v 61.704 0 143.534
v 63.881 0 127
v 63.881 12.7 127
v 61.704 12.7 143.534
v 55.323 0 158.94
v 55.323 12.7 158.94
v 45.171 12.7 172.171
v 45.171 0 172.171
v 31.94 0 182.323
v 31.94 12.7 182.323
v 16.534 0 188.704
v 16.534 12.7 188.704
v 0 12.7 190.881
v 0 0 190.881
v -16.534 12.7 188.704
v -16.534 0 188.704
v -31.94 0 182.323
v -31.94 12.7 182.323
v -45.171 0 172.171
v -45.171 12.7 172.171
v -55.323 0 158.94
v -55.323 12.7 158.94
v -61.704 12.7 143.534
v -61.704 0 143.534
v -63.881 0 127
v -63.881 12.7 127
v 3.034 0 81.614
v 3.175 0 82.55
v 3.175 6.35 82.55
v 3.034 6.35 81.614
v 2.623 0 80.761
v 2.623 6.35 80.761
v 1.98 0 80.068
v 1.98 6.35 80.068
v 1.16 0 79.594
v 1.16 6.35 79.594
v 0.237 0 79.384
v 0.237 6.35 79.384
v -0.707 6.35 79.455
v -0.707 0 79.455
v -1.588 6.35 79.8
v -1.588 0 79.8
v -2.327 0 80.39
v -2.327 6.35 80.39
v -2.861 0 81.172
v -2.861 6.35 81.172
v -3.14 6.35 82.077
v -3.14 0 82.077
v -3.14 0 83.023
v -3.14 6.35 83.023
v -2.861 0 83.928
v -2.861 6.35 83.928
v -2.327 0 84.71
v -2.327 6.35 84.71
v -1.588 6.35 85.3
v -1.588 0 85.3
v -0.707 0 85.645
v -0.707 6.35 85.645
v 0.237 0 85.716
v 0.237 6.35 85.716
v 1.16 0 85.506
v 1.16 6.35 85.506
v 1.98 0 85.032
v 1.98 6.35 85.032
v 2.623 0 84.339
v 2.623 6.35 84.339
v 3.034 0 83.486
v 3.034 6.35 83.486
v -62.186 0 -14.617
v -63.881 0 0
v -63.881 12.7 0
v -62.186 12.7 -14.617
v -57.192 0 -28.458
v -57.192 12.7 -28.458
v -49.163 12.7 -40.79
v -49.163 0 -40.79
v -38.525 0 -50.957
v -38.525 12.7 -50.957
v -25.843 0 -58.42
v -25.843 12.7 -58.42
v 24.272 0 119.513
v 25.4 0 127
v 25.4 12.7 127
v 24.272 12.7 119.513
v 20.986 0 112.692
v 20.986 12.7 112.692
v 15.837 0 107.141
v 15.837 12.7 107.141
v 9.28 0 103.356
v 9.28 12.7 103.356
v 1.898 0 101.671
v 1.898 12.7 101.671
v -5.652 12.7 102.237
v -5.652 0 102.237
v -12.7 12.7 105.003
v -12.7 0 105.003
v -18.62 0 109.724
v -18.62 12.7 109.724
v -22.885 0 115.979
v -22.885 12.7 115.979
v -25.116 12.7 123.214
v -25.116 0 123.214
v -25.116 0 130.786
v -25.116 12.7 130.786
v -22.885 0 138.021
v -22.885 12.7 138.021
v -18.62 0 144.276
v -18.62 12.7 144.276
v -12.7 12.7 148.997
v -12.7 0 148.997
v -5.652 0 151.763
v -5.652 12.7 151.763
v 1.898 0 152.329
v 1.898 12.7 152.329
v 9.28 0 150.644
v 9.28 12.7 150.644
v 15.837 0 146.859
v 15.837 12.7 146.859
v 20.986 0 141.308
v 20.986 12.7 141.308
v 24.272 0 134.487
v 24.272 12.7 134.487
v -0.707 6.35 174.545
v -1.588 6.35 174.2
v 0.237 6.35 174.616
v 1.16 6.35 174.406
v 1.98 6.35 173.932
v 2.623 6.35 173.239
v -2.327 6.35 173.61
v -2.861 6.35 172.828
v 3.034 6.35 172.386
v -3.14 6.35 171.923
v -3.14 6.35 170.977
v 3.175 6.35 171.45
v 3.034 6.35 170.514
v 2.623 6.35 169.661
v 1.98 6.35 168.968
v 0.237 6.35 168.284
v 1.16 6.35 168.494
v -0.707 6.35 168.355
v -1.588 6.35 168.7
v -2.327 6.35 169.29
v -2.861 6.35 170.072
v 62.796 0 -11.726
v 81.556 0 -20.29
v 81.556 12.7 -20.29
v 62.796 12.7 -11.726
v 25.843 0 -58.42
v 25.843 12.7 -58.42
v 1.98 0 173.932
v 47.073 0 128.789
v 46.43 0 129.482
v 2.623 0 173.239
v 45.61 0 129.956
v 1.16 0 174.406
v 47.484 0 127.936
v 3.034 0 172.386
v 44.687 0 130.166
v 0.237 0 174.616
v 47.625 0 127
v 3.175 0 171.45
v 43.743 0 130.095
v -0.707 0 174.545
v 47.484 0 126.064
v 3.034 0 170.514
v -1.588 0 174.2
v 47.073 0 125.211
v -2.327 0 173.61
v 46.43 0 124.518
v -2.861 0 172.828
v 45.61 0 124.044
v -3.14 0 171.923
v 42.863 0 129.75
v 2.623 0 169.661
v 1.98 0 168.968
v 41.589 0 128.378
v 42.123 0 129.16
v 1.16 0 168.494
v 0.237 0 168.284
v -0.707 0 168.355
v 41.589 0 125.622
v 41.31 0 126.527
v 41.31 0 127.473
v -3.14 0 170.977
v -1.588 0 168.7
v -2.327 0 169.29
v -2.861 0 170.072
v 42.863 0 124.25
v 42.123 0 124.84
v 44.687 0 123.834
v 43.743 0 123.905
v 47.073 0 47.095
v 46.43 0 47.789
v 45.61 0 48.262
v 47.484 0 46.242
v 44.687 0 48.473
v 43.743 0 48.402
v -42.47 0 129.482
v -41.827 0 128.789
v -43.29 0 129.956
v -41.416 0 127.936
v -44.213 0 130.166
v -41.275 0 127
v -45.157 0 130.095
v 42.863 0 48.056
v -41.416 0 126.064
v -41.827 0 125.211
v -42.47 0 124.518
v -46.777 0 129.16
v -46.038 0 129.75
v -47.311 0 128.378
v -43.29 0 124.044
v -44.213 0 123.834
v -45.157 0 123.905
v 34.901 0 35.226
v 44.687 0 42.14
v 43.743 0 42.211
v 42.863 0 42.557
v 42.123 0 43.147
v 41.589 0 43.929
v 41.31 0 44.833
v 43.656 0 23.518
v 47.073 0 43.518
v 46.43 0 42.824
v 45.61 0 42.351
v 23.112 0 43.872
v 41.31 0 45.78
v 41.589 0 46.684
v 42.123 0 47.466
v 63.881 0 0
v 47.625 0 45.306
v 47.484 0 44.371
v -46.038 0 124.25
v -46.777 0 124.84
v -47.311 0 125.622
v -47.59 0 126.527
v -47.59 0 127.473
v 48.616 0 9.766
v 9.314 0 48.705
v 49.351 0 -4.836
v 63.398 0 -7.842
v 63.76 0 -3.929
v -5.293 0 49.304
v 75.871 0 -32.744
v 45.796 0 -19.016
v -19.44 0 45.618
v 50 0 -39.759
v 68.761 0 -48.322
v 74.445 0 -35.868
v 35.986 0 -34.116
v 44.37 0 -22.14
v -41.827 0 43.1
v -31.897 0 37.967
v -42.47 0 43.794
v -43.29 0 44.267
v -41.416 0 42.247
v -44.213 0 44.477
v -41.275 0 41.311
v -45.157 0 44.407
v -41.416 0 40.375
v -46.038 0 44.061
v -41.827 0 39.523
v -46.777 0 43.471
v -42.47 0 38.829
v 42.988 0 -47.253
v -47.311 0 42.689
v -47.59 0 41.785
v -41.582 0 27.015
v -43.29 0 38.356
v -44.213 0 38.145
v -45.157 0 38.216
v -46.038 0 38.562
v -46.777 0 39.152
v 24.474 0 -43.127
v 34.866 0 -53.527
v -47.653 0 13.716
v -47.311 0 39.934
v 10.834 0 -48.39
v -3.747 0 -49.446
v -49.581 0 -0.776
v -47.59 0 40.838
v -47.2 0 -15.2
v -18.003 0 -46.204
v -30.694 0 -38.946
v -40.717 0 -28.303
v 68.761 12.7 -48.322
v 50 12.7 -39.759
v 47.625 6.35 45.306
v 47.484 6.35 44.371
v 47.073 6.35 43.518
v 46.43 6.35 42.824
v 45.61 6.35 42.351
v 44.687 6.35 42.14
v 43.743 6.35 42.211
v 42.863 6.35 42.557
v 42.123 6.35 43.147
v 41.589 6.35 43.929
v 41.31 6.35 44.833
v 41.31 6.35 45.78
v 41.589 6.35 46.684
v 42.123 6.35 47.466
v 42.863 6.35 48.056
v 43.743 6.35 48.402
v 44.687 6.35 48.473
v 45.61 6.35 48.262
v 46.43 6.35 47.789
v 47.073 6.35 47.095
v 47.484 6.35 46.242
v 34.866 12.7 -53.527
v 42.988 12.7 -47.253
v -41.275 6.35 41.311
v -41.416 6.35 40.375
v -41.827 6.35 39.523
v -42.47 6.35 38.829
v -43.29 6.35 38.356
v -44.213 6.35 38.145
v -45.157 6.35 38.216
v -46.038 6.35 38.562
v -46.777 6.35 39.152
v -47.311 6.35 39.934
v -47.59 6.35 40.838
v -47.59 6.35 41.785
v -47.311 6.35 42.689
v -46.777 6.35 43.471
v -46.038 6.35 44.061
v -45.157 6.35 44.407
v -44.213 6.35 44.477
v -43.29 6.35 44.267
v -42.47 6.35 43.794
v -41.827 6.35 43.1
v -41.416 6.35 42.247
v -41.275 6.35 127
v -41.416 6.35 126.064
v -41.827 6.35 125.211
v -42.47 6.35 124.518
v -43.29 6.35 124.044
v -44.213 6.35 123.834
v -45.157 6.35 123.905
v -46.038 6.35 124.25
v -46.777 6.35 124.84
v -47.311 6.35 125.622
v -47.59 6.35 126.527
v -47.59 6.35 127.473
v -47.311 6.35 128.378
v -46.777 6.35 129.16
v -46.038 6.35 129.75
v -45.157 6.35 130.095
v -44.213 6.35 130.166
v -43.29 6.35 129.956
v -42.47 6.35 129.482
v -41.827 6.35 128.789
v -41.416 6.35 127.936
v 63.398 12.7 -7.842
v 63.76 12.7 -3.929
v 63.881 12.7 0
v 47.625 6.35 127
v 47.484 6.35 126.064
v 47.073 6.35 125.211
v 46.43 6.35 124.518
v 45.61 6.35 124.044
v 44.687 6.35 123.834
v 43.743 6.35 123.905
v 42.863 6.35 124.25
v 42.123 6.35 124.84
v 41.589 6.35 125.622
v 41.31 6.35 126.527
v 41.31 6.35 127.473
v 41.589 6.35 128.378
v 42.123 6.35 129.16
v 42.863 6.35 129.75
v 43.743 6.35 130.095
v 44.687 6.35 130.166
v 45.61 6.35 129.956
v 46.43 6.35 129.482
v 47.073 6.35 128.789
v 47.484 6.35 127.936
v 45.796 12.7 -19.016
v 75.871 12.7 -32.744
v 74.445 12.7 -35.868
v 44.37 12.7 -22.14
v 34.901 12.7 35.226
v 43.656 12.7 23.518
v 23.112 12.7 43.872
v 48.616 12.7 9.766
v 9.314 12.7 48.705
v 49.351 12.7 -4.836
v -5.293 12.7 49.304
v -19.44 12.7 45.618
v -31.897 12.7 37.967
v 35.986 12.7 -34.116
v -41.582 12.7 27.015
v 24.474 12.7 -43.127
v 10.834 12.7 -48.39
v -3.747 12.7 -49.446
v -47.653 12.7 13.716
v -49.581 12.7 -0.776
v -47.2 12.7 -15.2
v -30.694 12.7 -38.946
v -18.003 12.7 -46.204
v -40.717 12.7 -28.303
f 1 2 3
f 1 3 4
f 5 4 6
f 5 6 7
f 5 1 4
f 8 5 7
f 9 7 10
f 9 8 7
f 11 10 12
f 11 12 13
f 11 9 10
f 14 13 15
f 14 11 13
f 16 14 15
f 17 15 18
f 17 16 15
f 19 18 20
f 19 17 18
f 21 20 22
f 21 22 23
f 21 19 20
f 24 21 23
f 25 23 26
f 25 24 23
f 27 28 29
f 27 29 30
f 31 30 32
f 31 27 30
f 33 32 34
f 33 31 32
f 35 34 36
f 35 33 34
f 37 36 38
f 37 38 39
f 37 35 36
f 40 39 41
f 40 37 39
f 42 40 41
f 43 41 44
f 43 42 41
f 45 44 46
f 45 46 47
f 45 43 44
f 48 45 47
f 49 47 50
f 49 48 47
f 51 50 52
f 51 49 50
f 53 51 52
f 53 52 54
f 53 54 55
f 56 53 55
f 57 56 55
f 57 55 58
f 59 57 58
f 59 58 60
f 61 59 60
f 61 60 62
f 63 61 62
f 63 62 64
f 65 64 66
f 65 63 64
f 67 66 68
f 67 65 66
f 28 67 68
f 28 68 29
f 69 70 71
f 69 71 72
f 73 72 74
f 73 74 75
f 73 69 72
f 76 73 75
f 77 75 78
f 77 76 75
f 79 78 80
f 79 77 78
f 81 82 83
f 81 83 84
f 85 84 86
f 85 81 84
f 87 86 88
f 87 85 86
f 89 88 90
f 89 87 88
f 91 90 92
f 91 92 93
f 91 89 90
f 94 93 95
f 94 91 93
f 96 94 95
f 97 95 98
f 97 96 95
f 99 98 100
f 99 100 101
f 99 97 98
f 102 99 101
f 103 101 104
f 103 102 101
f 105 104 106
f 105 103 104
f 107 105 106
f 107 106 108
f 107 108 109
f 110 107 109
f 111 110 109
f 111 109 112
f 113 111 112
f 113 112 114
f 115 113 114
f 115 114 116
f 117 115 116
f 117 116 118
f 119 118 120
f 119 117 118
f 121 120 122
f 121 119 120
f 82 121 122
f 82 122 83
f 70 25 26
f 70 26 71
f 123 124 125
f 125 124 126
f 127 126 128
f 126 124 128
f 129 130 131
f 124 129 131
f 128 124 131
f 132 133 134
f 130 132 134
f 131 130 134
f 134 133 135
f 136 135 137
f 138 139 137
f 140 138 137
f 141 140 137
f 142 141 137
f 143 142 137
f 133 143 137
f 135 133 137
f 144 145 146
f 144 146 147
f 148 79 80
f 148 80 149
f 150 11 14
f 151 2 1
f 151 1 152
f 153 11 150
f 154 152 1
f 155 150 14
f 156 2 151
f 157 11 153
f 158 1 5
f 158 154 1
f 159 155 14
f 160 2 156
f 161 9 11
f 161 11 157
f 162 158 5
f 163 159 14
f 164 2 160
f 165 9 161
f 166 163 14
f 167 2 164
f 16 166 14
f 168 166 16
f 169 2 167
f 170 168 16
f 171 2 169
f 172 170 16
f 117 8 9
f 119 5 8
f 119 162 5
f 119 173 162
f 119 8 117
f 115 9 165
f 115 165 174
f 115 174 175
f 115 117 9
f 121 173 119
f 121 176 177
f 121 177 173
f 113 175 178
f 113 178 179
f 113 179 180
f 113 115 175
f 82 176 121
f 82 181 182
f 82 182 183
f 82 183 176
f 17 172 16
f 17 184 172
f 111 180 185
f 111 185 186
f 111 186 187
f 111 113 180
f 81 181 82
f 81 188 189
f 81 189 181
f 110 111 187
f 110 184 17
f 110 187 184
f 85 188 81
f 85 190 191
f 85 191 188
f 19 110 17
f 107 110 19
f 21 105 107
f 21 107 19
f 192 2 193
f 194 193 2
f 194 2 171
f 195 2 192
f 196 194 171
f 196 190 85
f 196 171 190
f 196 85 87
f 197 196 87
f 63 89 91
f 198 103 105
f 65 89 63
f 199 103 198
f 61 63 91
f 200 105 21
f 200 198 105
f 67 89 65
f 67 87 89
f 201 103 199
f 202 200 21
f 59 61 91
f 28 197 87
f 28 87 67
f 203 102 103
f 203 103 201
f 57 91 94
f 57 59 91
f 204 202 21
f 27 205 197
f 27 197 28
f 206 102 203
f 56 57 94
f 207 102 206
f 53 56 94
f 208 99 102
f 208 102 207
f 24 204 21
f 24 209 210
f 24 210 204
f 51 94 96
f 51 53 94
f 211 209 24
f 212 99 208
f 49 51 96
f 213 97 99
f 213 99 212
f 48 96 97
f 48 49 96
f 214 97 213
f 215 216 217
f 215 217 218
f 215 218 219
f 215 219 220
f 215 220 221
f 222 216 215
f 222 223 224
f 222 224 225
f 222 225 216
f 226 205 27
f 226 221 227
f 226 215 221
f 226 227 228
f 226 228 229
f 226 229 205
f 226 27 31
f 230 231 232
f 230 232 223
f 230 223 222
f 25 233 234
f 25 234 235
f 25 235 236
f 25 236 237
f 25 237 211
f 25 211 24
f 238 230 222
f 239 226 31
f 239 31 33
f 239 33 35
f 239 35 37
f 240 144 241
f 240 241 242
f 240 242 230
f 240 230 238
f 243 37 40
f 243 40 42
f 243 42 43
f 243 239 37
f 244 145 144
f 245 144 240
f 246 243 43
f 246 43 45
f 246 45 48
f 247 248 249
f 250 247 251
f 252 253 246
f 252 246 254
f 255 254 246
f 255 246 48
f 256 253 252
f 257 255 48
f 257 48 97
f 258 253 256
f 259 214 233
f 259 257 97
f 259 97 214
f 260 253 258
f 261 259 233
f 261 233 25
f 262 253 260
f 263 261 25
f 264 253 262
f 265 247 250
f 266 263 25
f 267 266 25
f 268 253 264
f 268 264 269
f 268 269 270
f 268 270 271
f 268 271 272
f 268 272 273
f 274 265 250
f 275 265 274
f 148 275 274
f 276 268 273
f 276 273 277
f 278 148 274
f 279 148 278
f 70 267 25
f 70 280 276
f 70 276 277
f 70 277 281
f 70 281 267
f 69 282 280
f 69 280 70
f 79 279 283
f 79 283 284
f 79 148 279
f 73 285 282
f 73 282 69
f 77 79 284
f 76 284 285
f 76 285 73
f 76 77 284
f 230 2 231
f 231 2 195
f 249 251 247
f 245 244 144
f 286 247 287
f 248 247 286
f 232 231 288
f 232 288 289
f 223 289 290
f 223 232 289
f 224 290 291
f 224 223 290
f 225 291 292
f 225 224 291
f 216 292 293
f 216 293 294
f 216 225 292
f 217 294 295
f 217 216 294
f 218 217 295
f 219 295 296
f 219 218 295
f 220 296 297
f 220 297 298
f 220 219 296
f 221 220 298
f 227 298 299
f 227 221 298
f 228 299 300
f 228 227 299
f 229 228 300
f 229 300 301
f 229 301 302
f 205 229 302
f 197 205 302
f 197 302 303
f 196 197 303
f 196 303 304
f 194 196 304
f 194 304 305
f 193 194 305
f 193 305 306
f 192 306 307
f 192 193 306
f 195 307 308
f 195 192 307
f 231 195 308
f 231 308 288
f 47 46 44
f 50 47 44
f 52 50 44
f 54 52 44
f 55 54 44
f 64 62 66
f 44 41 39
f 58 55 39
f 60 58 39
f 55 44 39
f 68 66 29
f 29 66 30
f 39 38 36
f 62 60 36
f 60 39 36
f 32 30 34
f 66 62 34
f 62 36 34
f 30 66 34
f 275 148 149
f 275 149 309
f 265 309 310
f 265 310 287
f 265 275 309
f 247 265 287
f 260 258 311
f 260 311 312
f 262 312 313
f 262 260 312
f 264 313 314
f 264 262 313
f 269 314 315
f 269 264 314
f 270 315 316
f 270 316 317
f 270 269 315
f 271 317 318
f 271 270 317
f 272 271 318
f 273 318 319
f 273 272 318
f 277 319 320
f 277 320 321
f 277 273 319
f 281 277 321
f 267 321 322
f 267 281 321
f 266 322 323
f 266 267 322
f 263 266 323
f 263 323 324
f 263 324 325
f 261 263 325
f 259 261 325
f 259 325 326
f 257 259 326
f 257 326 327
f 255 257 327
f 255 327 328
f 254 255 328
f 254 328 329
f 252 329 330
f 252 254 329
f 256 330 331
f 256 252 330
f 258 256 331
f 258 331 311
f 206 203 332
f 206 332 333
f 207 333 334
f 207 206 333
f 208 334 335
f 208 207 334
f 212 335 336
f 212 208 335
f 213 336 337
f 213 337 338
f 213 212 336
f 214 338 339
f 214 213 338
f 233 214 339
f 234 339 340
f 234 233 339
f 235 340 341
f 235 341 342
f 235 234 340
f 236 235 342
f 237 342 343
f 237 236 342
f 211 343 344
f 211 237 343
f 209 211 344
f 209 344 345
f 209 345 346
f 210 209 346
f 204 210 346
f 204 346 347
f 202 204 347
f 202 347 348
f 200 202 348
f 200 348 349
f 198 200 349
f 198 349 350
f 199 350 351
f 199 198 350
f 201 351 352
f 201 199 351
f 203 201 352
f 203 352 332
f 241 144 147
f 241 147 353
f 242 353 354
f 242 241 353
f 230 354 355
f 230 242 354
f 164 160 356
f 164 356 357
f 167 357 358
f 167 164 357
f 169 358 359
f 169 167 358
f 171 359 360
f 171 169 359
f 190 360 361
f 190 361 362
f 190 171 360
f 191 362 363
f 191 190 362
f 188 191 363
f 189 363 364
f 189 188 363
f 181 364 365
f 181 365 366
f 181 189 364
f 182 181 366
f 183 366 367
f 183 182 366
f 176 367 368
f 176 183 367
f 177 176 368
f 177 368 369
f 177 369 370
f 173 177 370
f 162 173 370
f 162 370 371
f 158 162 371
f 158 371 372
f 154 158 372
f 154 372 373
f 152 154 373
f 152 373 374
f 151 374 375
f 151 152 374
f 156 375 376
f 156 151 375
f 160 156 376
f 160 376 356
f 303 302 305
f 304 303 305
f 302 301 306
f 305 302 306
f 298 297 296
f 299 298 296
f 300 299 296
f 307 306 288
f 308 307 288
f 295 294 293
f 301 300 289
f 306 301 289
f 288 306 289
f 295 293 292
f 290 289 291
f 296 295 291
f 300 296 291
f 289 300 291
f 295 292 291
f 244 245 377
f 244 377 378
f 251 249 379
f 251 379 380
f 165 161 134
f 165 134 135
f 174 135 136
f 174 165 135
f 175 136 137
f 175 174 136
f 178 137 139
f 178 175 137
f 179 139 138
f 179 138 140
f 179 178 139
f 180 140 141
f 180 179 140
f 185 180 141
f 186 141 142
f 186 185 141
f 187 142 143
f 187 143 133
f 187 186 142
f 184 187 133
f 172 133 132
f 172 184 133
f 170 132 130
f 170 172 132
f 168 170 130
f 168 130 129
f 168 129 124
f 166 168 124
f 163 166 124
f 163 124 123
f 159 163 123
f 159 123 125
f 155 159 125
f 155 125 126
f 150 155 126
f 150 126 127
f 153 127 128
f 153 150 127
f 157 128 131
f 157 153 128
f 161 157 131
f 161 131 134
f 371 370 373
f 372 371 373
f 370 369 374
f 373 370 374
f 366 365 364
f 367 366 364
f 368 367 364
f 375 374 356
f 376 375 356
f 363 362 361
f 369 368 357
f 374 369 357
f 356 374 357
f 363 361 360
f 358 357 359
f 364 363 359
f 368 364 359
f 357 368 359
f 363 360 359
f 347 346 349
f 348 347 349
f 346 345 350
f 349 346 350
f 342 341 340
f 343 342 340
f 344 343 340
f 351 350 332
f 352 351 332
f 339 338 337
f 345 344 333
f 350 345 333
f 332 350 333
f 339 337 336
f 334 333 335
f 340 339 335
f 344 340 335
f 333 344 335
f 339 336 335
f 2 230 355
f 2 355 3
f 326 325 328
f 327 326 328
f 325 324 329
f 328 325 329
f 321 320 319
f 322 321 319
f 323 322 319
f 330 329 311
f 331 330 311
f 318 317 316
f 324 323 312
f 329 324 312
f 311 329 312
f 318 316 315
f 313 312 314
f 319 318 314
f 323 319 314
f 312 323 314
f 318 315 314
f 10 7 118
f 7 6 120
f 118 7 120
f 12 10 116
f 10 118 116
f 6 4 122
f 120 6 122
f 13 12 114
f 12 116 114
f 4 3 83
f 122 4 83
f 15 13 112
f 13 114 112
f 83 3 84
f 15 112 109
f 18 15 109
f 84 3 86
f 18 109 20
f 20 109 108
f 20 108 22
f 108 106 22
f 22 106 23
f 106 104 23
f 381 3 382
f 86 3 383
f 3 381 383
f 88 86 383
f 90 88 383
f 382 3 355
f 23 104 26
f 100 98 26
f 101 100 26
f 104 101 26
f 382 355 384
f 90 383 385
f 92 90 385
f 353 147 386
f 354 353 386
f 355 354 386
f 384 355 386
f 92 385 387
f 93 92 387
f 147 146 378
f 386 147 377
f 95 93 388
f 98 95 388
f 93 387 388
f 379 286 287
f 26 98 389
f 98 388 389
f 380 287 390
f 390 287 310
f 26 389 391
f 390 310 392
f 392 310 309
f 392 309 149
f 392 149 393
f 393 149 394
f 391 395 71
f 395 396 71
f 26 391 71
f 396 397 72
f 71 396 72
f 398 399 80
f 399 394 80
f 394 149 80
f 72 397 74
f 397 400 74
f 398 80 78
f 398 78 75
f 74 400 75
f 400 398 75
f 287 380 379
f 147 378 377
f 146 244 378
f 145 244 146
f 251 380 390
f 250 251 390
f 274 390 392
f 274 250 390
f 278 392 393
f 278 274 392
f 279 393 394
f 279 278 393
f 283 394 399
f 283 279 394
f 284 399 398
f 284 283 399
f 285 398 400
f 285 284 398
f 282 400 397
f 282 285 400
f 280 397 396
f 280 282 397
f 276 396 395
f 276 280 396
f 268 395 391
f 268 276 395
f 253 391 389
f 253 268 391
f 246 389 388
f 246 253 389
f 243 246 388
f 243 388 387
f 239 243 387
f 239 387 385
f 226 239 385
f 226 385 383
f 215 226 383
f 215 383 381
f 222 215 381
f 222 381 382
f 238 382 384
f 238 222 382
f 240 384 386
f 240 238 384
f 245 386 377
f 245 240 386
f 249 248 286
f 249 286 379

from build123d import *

# Parameters (mm, degrees)
SKETCH1_R           = 25.4
BOSS_EXTRUDE5_DEPTH = 12.7
SKETCH4_9_R         = 49.587536422
CUT_EXTRUDE9_DEPTH  = 12.7
SKETCH4_10_R        = 3.175
CUT_EXTRUDE10_DEPTH = 6.35


with BuildPart() as part:
    # Sketch1 → Boss-Extrude5 (new body)
    with BuildSketch(Plane(origin=(0, 0, 0), x_dir=(1, 0, 0), z_dir=(0, 1, 0))):
        with BuildLine():
            Line((63.881, 0), (63.881, -127))
            ThreePointArc((63.881, -127), (0, -190.881), (-63.881, -127))
            Line((-63.881, -127), (-63.881, 0))
            ThreePointArc((-63.881, 0), (-53.533587031, 34.855949573), (-25.843485852, 58.42))
            Line((-25.843485852, 58.42), (0, 58.42))
            Line((0, 58.42), (25.843485852, 58.42))
            ThreePointArc((25.843485852, 58.42), (39.052759066, 50.553577226), (50.000033281, 39.759009455))
            Line((50.000033281, 39.759009455), (68.760605235, 48.322238074))
            Line((68.760605235, 48.322238074), (74.445380321, 35.867866389))
            Line((74.445380321, 35.867866389), (43.162005956, 21.588627605))
            ThreePointArc((43.162005956, 21.588627605), (-43.902763298, -20.039335689), (44.587930732, 18.464669861))
            Line((44.587930732, 18.464669861), (75.871305097, 32.743908644))
            Line((75.871305097, 32.743908644), (81.556080183, 20.289536959))
            Line((81.556080183, 20.289536959), (62.795508229, 11.726308341))
            ThreePointArc((62.795508229, 11.726308341), (63.609048186, 5.888221287), (63.881, 0))
        make_face()
        with Locations((0, -127)):
            Circle(SKETCH1_R, mode=Mode.SUBTRACT)
    extrude(amount=BOSS_EXTRUDE5_DEPTH)

    # Sketch4_9 → Cut-Extrude9 (cut)
    with BuildSketch(Plane(origin=(0, 0, 0), x_dir=(1, 0, 0), z_dir=(0, 1, 0))):
        Circle(SKETCH4_9_R)
    extrude(amount=CUT_EXTRUDE9_DEPTH, mode=Mode.SUBTRACT)

    # Sketch4_10 → Cut-Extrude10 (cut)
    with BuildSketch(Plane(origin=(0, 0, 0), x_dir=(1, 0, 0), z_dir=(0, 1, 0))):
        with Locations((0, -171.45)):
            Circle(SKETCH4_10_R)
        with Locations((-44.45, -127)):
            Circle(SKETCH4_10_R)
        with Locations((44.45, -127)):
            Circle(SKETCH4_10_R)
        with Locations((0, -82.55)):
            Circle(SKETCH4_10_R)
        with Locations((-44.45, -41.311332975)):
            Circle(SKETCH4_10_R)
        with Locations((44.45, -45.306446958)):
            Circle(SKETCH4_10_R)
    extrude(amount=CUT_EXTRUDE10_DEPTH, mode=Mode.SUBTRACT)


solid = part.part
